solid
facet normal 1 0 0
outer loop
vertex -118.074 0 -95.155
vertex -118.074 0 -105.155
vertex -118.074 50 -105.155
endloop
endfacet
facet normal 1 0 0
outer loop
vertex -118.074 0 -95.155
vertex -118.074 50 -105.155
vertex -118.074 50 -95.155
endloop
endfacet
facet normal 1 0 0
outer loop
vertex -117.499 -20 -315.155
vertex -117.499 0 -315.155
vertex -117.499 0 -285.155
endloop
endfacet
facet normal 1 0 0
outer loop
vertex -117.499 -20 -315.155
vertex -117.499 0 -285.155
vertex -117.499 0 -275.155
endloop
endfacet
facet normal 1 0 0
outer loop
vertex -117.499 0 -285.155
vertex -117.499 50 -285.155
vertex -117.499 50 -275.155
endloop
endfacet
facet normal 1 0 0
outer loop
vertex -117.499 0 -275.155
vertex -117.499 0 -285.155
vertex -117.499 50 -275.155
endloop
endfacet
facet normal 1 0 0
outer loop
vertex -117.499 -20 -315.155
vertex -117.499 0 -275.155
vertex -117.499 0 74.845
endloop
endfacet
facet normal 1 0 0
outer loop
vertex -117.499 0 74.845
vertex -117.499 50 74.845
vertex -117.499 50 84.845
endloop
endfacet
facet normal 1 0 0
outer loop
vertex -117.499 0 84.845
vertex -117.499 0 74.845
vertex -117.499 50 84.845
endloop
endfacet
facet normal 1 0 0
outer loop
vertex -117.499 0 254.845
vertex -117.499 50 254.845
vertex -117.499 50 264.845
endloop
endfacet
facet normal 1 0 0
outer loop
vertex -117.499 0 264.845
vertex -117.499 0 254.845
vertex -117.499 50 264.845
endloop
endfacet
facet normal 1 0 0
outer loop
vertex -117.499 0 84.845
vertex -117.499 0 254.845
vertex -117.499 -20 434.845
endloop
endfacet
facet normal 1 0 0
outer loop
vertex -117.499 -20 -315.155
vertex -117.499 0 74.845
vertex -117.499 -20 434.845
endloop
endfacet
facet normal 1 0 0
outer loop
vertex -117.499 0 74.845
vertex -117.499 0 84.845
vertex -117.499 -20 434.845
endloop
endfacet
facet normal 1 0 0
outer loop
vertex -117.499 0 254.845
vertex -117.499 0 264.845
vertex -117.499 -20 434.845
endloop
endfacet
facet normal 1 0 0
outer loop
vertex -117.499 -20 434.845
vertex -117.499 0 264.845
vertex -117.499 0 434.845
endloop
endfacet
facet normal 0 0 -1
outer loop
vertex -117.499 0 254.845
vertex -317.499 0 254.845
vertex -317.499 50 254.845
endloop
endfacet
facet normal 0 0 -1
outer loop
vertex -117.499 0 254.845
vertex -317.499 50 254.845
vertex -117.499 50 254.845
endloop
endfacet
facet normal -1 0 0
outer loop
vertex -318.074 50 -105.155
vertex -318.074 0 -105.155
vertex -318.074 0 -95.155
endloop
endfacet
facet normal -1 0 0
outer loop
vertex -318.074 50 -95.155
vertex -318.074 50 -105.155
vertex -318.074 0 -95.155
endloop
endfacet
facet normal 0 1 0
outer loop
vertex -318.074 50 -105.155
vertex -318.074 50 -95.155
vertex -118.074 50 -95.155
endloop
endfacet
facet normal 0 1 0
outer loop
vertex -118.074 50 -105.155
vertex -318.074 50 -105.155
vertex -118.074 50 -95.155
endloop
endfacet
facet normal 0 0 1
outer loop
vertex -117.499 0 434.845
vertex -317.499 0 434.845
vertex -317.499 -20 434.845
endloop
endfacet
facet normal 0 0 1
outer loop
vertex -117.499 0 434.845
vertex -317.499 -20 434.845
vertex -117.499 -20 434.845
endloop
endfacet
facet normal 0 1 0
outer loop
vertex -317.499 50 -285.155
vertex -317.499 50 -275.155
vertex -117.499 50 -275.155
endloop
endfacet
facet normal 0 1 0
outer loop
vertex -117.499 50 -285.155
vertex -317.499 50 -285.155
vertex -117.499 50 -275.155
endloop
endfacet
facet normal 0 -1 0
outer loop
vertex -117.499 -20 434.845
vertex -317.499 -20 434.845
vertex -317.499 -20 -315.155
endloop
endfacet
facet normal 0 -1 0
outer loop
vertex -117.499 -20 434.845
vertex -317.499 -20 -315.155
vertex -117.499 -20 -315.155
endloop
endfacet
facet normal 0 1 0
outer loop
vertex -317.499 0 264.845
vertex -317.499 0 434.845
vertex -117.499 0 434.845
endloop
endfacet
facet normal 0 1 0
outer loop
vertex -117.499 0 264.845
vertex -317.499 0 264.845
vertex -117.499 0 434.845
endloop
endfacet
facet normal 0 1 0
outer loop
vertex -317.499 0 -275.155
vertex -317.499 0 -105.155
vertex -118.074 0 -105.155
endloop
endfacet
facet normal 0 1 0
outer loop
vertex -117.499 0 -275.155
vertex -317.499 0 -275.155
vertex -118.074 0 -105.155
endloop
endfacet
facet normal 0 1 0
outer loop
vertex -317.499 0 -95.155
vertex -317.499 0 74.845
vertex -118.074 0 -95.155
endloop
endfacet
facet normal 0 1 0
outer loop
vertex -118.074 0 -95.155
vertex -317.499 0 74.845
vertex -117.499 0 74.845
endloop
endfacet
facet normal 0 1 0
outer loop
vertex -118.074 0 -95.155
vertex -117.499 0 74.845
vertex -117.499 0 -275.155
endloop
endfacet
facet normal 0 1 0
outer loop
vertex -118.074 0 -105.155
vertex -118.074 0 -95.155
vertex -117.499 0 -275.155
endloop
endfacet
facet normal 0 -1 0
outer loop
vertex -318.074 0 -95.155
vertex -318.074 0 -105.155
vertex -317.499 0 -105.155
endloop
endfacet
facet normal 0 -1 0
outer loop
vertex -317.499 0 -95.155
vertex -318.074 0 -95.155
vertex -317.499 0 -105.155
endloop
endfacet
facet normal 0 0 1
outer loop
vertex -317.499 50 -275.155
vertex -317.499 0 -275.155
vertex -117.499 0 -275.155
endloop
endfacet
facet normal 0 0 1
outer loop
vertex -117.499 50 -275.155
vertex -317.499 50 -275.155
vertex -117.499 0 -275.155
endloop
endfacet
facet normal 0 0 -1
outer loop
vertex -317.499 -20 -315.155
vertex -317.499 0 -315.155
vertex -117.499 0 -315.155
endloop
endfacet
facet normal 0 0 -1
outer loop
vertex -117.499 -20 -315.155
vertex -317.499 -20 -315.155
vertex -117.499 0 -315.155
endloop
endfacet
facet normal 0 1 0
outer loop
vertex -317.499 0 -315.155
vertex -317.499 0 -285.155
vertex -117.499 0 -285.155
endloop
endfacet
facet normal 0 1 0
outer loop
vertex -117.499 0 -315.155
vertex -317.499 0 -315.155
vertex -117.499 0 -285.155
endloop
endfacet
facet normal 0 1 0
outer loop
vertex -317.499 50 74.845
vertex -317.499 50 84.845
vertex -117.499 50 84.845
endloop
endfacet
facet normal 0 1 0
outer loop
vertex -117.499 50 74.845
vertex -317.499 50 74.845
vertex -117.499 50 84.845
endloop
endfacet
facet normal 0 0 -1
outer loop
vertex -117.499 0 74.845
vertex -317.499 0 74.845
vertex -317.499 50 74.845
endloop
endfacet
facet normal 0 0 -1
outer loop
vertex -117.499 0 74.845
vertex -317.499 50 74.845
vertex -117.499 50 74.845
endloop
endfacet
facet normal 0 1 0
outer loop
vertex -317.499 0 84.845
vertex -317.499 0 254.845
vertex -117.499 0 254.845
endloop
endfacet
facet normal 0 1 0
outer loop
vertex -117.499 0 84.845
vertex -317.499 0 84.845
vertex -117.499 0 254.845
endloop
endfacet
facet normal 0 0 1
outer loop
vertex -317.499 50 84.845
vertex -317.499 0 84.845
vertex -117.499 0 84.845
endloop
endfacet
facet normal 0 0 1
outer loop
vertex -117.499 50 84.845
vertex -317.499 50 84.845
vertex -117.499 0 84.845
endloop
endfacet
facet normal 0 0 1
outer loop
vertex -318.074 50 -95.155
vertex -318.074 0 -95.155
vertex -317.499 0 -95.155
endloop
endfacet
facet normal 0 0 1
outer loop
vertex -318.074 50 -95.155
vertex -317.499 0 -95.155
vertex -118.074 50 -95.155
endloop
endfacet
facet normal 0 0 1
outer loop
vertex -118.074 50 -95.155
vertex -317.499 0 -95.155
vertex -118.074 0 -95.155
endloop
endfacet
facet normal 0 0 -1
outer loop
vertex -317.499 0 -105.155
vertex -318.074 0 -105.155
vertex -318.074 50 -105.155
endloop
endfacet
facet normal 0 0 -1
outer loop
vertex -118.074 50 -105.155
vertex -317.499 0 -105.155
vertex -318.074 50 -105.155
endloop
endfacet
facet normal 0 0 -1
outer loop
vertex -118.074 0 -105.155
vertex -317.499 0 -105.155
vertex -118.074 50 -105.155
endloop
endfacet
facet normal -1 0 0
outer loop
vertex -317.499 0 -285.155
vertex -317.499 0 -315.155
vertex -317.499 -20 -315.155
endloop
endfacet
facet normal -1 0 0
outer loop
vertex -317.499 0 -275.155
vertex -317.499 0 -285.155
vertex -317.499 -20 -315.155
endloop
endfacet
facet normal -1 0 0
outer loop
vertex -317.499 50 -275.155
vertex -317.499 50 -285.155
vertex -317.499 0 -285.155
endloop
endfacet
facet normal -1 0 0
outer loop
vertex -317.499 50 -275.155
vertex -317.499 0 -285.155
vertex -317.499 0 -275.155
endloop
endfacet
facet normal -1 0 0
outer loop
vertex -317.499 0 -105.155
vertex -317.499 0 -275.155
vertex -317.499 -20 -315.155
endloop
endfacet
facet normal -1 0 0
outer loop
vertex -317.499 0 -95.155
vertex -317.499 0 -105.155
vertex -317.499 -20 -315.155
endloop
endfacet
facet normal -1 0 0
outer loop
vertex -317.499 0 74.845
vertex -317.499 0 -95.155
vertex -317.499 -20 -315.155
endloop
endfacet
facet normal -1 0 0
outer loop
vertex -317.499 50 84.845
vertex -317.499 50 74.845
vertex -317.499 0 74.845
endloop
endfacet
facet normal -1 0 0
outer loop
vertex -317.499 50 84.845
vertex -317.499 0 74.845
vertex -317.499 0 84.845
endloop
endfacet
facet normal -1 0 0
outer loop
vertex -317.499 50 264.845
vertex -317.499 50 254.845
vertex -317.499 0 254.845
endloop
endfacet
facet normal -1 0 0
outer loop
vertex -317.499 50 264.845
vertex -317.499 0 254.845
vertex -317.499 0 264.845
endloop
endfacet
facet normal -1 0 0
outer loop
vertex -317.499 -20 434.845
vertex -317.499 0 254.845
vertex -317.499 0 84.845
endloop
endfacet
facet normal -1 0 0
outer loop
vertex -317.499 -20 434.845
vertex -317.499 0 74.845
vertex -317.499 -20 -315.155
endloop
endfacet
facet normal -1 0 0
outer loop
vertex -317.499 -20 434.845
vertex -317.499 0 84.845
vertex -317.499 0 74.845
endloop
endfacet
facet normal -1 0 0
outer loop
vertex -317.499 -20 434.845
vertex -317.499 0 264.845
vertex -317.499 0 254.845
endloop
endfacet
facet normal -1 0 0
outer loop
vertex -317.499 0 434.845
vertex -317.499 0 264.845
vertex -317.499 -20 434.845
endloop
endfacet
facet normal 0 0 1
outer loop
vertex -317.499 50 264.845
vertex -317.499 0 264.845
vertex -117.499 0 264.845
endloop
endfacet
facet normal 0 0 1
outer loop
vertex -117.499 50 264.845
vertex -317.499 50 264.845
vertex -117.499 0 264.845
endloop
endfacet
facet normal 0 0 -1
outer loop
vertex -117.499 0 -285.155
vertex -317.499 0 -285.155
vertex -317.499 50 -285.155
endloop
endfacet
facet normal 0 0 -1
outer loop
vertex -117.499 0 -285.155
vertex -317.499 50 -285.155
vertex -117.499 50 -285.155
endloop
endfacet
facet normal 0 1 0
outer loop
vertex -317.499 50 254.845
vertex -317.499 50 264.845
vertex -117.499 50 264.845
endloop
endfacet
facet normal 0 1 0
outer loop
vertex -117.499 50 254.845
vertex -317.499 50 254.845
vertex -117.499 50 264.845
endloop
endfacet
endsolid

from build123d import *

# Parameters (mm, degrees)
F0_W     = 200
F0_H     = 750
F1_DEPTH = 20
F2_W     = 200
F2_H     = 10
F3_DEPTH = 50
F4_W     = 200
F4_H     = 10
F5_DEPTH = 50
F6_W     = 200
F6_H     = 10
F7_DEPTH = 50
F8_W     = 200
F8_H     = 10
F9_DEPTH = 50


with BuildPart() as f1:
    # F0 (on Front) → F1 (new body)
    with BuildSketch(Plane.XZ):
        with Locations((-217.498518, 59.845)):
            Rectangle(F0_W, F0_H)
    extrude(amount=F1_DEPTH)

    # F2 (on Front) → F3 (join)
    with BuildSketch(Plane.XZ):
        with Locations((-218.074274, -100.155)):
            Rectangle(F2_W, F2_H)
    extrude(amount=-F3_DEPTH)

    # F4 (on Front) → F5 (join)
    with BuildSketch(Plane.XZ):
        with Locations((-217.498518, 79.845)):
            Rectangle(F4_W, F4_H)
    extrude(amount=-F5_DEPTH)

    # F6 (on Front) → F7 (join)
    with BuildSketch(Plane.XZ):
        with Locations((-217.498518, 259.845)):
            Rectangle(F6_W, F6_H)
    extrude(amount=-F7_DEPTH)

    # F8 (on Front) → F9 (join)
    with BuildSketch(Plane.XZ):
        with Locations((-217.498518, -280.155)):
            Rectangle(F8_W, F8_H)
    extrude(amount=-F9_DEPTH)


solid = f1.part
